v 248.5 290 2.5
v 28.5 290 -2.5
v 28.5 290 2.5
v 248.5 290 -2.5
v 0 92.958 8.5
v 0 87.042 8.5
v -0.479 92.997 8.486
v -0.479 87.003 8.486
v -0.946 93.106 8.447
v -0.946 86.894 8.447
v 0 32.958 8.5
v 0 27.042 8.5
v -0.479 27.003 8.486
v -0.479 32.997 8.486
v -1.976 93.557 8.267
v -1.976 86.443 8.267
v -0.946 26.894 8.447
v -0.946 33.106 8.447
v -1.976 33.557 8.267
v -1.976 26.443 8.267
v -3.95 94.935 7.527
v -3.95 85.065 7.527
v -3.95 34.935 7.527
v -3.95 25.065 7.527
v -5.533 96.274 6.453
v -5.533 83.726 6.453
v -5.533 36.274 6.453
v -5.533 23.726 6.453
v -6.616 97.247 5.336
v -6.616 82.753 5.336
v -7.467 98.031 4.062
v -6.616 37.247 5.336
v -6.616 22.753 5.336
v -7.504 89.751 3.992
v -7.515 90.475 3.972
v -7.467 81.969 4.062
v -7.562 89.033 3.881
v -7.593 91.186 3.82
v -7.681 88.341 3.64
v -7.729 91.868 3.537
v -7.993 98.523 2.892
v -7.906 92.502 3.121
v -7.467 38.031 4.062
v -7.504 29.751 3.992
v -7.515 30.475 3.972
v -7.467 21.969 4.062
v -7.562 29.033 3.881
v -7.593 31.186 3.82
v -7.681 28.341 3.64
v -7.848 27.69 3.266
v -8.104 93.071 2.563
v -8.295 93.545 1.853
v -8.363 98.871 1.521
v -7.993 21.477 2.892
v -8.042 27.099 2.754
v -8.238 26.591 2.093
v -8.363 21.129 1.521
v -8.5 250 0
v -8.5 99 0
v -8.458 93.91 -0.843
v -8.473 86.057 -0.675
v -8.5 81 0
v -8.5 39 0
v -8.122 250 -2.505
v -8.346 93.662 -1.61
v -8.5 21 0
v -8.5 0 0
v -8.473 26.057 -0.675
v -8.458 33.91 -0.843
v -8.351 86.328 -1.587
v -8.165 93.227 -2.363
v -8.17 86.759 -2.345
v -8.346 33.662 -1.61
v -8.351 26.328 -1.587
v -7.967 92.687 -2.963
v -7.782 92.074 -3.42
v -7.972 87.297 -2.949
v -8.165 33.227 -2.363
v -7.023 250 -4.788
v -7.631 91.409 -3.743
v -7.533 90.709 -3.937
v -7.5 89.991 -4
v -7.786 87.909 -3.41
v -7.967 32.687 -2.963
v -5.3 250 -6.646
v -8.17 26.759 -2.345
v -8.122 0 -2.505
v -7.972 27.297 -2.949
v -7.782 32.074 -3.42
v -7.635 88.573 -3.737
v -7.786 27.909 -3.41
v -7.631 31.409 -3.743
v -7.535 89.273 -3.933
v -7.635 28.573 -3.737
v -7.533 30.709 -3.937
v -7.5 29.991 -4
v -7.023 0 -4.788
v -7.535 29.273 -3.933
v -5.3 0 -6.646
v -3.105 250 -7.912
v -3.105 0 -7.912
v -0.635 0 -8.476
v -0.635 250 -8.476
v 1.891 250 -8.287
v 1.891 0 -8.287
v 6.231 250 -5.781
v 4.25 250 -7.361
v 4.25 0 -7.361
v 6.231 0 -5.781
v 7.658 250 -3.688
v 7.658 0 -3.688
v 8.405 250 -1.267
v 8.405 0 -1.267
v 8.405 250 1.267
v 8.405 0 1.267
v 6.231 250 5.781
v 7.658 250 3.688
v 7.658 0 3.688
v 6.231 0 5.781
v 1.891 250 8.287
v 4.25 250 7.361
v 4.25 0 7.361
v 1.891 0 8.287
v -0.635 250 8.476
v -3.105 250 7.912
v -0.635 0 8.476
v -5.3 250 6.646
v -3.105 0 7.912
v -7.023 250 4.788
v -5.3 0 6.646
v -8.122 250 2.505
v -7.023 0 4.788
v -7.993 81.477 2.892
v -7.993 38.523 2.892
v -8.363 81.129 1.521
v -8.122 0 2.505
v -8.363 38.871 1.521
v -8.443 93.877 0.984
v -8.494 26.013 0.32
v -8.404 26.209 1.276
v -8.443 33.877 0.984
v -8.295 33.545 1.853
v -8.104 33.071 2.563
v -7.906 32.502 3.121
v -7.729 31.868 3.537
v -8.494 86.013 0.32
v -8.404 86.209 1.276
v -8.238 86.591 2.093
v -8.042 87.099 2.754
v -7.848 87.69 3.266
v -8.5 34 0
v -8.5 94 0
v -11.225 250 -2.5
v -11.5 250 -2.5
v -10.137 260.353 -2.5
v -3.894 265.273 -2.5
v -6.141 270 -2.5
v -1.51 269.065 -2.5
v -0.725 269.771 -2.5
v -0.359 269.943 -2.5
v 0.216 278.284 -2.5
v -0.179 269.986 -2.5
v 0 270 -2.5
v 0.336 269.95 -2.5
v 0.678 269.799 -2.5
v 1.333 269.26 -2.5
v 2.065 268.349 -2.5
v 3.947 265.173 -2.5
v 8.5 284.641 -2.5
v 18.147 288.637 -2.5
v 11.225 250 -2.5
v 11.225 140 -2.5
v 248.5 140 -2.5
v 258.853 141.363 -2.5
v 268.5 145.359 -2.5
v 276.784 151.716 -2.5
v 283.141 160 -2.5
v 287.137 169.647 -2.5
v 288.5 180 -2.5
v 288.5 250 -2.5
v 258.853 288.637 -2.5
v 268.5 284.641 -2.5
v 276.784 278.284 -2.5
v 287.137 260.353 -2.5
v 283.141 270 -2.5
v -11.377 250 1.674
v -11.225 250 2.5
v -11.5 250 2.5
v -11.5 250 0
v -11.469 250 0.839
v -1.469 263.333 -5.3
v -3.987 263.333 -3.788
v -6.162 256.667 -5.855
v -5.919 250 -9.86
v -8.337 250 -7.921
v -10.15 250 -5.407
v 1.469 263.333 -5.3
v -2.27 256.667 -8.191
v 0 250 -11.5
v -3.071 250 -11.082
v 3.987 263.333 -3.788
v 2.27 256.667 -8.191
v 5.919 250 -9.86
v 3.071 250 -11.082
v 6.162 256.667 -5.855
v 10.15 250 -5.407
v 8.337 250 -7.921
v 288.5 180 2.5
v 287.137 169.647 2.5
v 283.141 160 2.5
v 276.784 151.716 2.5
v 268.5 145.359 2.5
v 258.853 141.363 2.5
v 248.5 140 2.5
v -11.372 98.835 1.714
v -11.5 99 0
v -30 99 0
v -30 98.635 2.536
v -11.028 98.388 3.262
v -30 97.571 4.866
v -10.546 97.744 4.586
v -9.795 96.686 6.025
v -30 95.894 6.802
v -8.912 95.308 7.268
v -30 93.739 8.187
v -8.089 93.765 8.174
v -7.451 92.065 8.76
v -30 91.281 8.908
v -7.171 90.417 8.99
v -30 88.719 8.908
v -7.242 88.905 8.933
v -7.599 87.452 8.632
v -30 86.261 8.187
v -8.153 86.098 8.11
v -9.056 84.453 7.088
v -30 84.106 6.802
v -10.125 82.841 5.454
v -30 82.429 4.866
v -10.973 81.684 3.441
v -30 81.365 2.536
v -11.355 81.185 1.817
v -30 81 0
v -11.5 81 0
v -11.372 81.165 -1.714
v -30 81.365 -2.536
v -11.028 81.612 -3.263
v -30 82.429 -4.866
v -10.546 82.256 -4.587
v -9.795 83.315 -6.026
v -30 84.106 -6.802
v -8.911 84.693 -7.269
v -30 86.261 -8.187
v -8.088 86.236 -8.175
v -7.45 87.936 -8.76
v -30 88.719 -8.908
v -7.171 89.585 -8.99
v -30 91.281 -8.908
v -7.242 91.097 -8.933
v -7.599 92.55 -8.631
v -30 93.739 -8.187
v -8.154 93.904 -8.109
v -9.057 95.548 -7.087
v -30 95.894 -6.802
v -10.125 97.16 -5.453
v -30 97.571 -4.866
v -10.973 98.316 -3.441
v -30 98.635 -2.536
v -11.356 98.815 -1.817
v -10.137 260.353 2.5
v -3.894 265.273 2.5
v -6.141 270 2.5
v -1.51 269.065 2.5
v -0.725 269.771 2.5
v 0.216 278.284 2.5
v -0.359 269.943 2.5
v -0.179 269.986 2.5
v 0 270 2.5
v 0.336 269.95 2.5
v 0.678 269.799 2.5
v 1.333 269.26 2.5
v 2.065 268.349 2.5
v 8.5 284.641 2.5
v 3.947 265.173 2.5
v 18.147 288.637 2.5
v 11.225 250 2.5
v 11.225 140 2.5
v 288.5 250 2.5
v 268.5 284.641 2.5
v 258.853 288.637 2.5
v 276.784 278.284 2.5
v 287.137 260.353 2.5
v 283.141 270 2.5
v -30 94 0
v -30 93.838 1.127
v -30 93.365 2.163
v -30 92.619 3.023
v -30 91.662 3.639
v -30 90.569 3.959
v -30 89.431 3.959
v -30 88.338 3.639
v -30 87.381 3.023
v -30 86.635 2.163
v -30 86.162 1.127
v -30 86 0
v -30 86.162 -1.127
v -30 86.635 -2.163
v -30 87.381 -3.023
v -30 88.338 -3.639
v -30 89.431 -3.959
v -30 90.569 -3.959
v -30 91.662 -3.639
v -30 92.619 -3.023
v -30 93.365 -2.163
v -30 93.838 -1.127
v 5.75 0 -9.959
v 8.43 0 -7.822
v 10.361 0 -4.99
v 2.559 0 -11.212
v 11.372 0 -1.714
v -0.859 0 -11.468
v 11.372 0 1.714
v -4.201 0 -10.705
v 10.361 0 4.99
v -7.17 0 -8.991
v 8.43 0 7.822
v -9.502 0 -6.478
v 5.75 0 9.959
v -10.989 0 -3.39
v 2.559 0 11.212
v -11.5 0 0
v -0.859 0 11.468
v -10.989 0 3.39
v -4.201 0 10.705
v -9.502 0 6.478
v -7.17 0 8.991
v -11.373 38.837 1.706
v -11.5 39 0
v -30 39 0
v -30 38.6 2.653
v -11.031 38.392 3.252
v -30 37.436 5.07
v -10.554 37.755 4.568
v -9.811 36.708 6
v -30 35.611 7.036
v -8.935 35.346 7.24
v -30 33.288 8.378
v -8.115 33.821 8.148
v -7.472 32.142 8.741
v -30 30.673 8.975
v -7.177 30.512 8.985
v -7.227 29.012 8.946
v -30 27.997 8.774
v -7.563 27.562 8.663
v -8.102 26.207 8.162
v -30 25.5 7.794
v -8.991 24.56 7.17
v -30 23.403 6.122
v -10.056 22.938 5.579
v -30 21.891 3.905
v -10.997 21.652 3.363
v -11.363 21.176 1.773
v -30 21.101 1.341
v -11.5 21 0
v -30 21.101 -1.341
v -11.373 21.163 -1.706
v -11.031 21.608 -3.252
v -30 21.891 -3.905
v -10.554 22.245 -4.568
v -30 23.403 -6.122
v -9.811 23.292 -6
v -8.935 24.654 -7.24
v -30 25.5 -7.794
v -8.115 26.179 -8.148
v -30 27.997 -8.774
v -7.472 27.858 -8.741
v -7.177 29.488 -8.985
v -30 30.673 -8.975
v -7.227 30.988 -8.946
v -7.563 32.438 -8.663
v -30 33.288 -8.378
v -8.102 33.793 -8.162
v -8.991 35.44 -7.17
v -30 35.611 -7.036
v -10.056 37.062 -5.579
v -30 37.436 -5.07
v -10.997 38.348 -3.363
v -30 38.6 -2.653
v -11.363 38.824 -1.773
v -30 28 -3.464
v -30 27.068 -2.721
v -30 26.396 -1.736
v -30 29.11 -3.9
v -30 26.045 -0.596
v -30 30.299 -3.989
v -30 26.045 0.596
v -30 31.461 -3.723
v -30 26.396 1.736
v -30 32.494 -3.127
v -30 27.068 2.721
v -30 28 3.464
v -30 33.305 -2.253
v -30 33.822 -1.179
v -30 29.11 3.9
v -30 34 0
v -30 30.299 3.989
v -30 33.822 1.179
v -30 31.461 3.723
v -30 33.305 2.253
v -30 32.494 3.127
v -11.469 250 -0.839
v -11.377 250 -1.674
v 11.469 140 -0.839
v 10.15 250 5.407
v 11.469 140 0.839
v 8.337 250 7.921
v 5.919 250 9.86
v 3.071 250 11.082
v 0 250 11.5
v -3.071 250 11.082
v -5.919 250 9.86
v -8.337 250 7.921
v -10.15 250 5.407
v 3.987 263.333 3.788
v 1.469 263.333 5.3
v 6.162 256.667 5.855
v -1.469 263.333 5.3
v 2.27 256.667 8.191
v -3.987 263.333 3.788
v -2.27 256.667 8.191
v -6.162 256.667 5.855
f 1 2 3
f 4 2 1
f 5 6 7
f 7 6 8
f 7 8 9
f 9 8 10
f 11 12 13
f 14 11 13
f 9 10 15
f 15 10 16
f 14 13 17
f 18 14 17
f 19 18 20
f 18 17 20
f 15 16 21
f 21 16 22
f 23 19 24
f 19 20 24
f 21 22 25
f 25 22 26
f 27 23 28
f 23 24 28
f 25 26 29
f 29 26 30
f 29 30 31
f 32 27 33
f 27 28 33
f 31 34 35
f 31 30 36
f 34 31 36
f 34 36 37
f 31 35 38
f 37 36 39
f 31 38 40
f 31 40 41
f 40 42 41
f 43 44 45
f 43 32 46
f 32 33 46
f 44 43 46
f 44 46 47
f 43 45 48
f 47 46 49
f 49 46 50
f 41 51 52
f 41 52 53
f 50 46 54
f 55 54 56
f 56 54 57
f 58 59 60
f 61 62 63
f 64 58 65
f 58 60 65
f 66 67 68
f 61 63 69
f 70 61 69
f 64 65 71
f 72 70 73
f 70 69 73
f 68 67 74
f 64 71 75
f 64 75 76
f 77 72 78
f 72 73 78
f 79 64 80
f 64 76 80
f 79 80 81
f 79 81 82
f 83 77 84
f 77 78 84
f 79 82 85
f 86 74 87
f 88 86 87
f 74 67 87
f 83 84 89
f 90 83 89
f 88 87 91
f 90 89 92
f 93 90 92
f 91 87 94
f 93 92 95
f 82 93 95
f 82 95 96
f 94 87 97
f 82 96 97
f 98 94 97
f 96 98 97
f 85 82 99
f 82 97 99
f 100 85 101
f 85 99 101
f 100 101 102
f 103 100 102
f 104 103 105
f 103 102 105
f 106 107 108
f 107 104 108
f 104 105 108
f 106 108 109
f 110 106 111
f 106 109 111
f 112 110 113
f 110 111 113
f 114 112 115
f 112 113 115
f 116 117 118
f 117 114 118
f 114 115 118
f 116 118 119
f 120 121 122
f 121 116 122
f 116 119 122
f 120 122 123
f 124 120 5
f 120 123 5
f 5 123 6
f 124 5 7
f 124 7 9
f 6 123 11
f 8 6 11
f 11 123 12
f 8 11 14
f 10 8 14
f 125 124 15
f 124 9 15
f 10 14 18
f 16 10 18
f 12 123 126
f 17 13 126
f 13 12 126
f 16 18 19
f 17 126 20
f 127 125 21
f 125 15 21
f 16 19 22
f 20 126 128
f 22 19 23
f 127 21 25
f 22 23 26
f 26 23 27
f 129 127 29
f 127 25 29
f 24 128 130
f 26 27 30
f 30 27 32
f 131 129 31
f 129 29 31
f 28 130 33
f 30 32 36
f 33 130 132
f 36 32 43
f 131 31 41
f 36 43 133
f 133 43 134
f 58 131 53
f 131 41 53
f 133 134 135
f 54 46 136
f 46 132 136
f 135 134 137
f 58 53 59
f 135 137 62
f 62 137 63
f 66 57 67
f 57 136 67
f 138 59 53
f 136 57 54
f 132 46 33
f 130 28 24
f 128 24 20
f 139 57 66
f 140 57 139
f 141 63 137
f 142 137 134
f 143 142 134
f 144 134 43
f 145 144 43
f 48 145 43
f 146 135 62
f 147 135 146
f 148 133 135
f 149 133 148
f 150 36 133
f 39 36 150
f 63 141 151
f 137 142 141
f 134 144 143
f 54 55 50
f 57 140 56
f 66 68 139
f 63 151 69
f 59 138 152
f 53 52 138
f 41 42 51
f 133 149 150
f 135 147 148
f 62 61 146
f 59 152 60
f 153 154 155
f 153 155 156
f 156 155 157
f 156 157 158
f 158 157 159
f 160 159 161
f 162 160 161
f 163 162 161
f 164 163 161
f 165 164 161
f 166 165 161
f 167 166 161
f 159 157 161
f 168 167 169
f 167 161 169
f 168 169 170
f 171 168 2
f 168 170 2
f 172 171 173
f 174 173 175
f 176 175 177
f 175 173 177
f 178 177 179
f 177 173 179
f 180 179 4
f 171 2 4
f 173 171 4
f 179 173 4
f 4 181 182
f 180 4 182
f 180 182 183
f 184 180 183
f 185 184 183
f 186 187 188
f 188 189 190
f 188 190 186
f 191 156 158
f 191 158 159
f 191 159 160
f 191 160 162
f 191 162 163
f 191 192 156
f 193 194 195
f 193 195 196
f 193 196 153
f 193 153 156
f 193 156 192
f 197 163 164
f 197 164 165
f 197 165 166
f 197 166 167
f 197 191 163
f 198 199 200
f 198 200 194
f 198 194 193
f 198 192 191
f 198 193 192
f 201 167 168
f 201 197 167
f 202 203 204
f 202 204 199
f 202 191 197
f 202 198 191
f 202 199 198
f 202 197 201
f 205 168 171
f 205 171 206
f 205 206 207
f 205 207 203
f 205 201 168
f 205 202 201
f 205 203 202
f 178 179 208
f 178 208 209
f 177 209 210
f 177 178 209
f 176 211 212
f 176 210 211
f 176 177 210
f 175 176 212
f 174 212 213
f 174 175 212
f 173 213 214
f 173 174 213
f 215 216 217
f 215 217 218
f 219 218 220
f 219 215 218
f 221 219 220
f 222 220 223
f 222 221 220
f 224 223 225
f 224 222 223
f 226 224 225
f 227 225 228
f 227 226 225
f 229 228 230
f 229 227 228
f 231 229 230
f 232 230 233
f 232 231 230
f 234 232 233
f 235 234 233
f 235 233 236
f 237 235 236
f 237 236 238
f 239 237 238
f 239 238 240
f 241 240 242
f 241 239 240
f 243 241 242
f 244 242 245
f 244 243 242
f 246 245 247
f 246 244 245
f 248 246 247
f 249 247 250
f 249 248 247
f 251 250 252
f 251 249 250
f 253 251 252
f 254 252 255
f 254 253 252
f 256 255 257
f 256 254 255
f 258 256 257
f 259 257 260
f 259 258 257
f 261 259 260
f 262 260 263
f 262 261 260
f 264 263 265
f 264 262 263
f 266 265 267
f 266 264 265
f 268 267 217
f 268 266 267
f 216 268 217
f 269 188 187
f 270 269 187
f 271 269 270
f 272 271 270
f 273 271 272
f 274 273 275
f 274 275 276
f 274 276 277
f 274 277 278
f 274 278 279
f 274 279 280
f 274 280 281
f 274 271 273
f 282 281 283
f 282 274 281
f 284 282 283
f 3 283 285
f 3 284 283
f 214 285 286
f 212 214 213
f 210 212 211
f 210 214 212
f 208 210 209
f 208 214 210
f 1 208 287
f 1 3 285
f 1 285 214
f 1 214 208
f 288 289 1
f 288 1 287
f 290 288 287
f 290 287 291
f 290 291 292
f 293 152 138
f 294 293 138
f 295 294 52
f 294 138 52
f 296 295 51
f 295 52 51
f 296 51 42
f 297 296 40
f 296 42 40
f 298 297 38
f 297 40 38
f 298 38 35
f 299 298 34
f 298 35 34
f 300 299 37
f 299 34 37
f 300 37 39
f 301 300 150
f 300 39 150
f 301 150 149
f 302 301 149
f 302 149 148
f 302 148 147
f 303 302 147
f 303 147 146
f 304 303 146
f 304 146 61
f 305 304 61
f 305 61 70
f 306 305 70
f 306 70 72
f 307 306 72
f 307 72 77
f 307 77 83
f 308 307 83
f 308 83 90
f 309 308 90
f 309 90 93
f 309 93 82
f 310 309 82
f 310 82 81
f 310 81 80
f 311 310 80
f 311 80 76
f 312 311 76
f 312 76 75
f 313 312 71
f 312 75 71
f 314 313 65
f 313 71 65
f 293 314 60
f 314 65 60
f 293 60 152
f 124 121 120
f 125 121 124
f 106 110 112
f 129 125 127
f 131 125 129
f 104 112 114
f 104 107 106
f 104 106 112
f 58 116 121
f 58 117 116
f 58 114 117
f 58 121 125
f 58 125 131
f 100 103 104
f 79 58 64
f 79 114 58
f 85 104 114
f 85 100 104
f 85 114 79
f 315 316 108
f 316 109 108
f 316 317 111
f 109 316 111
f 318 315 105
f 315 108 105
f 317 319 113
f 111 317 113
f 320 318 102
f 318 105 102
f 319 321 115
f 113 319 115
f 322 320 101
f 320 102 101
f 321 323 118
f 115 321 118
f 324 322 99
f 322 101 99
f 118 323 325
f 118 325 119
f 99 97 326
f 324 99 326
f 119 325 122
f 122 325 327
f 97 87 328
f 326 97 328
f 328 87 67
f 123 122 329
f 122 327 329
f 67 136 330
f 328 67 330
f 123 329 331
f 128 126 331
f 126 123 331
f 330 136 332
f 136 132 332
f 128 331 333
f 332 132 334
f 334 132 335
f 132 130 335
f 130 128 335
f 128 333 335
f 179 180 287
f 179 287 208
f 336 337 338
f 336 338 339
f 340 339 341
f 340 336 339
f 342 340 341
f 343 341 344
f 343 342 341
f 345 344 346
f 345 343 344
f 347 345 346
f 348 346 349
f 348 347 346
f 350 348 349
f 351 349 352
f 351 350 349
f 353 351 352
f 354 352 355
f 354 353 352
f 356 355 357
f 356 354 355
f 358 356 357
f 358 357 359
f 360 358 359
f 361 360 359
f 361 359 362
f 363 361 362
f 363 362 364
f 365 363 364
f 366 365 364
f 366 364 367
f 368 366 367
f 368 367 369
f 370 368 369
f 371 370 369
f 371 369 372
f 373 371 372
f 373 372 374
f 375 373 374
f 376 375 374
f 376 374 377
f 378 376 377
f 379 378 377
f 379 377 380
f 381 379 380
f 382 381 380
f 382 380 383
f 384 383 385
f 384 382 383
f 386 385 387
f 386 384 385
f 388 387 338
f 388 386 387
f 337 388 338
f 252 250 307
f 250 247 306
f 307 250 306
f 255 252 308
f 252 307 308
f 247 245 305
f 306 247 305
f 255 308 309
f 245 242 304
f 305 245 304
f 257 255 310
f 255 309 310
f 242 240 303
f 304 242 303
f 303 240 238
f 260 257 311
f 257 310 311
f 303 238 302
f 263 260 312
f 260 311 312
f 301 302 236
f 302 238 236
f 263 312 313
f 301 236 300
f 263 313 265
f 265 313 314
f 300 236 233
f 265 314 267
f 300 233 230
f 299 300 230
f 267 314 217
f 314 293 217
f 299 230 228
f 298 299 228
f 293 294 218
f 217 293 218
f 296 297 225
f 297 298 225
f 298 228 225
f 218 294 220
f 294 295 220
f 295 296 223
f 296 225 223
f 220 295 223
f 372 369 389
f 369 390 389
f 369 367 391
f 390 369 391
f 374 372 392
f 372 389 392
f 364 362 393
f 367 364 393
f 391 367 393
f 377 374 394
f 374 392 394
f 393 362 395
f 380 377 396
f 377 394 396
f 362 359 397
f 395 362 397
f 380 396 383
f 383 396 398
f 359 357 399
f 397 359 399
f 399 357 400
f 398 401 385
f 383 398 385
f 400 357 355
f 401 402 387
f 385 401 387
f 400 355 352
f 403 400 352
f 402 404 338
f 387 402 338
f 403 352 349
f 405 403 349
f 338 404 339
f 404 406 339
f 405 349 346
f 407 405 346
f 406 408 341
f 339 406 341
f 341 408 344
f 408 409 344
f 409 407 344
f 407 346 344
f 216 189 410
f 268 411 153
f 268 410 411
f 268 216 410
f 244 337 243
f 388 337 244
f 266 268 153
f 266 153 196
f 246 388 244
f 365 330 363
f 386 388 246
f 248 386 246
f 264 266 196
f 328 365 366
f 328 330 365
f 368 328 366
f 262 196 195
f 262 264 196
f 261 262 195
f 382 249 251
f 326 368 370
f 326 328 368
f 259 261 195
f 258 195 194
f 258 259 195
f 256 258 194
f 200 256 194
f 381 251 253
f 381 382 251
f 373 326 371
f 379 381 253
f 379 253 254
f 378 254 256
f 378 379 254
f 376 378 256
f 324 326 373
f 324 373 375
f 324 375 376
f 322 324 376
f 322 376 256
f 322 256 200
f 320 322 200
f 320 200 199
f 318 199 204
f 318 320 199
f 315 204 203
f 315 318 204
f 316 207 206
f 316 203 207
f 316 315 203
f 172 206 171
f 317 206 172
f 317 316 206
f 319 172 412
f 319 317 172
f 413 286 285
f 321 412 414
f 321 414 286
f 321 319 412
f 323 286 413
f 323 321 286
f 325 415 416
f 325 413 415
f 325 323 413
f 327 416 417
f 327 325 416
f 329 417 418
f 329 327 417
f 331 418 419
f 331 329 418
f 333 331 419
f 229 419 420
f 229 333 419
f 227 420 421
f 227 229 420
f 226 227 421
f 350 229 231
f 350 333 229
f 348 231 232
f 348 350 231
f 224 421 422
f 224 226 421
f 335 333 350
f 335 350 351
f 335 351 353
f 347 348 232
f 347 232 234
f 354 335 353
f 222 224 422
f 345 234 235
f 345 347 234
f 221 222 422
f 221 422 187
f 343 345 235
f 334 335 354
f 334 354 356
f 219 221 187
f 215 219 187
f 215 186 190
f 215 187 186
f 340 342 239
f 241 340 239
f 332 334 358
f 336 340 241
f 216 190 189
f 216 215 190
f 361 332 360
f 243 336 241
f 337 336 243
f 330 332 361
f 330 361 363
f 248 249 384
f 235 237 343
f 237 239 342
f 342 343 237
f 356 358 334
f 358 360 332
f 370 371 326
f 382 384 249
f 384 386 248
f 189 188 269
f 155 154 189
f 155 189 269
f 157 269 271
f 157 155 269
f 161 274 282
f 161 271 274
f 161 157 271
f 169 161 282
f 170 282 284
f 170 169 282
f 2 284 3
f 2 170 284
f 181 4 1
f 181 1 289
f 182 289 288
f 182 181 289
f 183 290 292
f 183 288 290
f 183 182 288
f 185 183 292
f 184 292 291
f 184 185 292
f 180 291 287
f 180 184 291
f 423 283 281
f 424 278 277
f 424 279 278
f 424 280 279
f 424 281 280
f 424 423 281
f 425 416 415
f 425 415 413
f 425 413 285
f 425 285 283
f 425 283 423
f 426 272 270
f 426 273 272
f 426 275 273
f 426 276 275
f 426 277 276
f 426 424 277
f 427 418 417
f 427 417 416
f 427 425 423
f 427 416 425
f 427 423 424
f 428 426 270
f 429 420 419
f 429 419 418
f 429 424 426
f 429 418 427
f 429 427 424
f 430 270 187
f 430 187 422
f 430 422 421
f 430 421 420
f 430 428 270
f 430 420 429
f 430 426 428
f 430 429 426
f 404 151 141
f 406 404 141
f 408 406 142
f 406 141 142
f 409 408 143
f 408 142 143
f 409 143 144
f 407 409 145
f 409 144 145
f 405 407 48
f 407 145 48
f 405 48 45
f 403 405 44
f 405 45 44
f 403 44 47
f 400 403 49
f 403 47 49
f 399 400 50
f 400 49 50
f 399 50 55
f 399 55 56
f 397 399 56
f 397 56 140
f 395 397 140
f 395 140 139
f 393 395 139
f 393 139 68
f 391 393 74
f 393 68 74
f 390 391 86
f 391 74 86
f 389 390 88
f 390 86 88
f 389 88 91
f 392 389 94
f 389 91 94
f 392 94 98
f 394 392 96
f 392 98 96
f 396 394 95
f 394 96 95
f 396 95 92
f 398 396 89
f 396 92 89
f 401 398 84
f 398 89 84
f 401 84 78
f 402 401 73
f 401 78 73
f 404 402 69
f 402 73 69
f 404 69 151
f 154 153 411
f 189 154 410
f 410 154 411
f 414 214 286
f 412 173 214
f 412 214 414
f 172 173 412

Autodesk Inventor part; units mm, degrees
ref_plane "YZ Plane" through (0, 0, 0) normal (1, 0, 0) x (0, 1, 0)
ref_plane "XZ Plane" through (0, 0, 0) normal (0, 1, 0) x (-1, 0, 0)
ref_plane "XY Plane" through (0, 0, 0) normal (0, 0, 1) x (1, 0, 0)
sketch "Skizze1" plane through (0, 0, 0) normal (0, 1, 0) x (-1, 0, 0)
  circle A0 centre (0, 0) radius 8.5
  circle A1 centre (0, 0) radius 11.5
  dimension "d0" = 17
  dimension "d1" = 3
extrude "Extrusion1" add sketch "Skizze1" along normal blind 250
sketch "Skizze2" plane through (0, 0, 0) normal (0, 0, 1) x (1, 0, 0)
  line L0 (11.5, 250) -> (-11.5, 250) projected
  line L1 (-11.5, 250) -> (-11.5, 250)
  line L2 (28.5, 290) -> (248.5, 290)
  line L3 (288.5, 250) -> (288.5, 180)
  line L4 (248.5, 140) -> (8.5, 140)
  line L5 (8.5, 250) -> (8.5, 0) projected
  arc A0 (248.5, 140) -> (288.5, 180) centre (248.5, 180) ccw
  arc A1 (288.5, 250) -> (248.5, 290) centre (248.5, 250) ccw
  arc A2 (28.5, 290) -> (-11.5, 250) centre (28.5, 250) ccw
  point P0 (0, 0)
  point P1 (-11.5, 290)
  point P2 (288.5, 290)
  point P3 (288.5, 140)
  dimension "d4" = 40
  dimension "d5" = 300
  dimension "d6" = 150
  dimension "d7" = 40
extrude "Extrusion2" add sketch "Skizze2" along normal mid plane 5
sketch "Skizze3" plane through (0, 0, 0) normal (1, 0, 0) x (0, 1, 0)
  line L0 (250, -11.5) -> (250, -2.5) projected
  line L1 (250, -2.5) -> (180, -2.5) projected
  line L2 (250, -2.5) -> (250, -2.5)
  line L3 (250, -2.5) -> (250, -11.5)
  line L4 (-70, 0) -> (420, 0) projected
  line L5 (250, -11.5) -> (270, -2.5)
  line L6 (250, -2.5) -> (290, -2.5) projected
  point P0 (0, 0)
revolve "Umdrehung1" add sketch "Skizze3" angle 360 about axis through (0, -10, 0) along (0, 1, 0)
sketch "Skizze4" plane through (0, 0, 0) normal (1, 0, 0) x (0, 1, 0)
  line L0 (0, 0) -> (30, 0)
  line L1 (30, 0) -> (90, 0)
  circle A0 centre (30, 0) radius 5
  circle A1 centre (90, 0) radius 5
  dimension "d11" = 30
  dimension "d12" = 60
  dimension "d13" = 10
  dimension "d14" = 10
extrude "Extrusion3" cut sketch "Skizze4" against normal through all
sketch "Skizze5" plane through (0, 0, 0) normal (1, 0, 0) x (0, 1, 0)
  line L0 (0, 0) -> (30, 0)
  circle A0 centre (30, 0) radius 4
  circle A1 centre (30, 0) radius 9
  line L1 (30, 0) -> (90, 0)
  circle A2 centre (90, 0) radius 4
  circle A3 centre (90, 0) radius 9
  dimension "d17" = 30
  dimension "d18" = 8
  dimension "d19" = 5
  dimension "d20" = 60
  dimension "d21" = 8
  dimension "d22" = 5
extrude "Extrusion4" add sketch "Skizze5" against normal blind 30 contours A1 L1 A0 L0 | A3 | L0 A0 L1 A1
sketch "Skizze6" plane through (0, 0, 0) normal (0, -1, 0) x (1, 0, 0)
  circle A0 centre (0, 0) radius 8.5
  dimension "d25" = 17
extrude "Extrusion5" cut sketch "Skizze6" against normal blind 250
thread "Gewinde3" size "M8x1.25" class "6H" standard "ANSI Metric M Profile" length 60
thread "Gewinde4" size "M8x1.25" class "6H" standard "ANSI Metric M Profile" length 60
properties part number "HTW-000692" material "PVC, hart"
